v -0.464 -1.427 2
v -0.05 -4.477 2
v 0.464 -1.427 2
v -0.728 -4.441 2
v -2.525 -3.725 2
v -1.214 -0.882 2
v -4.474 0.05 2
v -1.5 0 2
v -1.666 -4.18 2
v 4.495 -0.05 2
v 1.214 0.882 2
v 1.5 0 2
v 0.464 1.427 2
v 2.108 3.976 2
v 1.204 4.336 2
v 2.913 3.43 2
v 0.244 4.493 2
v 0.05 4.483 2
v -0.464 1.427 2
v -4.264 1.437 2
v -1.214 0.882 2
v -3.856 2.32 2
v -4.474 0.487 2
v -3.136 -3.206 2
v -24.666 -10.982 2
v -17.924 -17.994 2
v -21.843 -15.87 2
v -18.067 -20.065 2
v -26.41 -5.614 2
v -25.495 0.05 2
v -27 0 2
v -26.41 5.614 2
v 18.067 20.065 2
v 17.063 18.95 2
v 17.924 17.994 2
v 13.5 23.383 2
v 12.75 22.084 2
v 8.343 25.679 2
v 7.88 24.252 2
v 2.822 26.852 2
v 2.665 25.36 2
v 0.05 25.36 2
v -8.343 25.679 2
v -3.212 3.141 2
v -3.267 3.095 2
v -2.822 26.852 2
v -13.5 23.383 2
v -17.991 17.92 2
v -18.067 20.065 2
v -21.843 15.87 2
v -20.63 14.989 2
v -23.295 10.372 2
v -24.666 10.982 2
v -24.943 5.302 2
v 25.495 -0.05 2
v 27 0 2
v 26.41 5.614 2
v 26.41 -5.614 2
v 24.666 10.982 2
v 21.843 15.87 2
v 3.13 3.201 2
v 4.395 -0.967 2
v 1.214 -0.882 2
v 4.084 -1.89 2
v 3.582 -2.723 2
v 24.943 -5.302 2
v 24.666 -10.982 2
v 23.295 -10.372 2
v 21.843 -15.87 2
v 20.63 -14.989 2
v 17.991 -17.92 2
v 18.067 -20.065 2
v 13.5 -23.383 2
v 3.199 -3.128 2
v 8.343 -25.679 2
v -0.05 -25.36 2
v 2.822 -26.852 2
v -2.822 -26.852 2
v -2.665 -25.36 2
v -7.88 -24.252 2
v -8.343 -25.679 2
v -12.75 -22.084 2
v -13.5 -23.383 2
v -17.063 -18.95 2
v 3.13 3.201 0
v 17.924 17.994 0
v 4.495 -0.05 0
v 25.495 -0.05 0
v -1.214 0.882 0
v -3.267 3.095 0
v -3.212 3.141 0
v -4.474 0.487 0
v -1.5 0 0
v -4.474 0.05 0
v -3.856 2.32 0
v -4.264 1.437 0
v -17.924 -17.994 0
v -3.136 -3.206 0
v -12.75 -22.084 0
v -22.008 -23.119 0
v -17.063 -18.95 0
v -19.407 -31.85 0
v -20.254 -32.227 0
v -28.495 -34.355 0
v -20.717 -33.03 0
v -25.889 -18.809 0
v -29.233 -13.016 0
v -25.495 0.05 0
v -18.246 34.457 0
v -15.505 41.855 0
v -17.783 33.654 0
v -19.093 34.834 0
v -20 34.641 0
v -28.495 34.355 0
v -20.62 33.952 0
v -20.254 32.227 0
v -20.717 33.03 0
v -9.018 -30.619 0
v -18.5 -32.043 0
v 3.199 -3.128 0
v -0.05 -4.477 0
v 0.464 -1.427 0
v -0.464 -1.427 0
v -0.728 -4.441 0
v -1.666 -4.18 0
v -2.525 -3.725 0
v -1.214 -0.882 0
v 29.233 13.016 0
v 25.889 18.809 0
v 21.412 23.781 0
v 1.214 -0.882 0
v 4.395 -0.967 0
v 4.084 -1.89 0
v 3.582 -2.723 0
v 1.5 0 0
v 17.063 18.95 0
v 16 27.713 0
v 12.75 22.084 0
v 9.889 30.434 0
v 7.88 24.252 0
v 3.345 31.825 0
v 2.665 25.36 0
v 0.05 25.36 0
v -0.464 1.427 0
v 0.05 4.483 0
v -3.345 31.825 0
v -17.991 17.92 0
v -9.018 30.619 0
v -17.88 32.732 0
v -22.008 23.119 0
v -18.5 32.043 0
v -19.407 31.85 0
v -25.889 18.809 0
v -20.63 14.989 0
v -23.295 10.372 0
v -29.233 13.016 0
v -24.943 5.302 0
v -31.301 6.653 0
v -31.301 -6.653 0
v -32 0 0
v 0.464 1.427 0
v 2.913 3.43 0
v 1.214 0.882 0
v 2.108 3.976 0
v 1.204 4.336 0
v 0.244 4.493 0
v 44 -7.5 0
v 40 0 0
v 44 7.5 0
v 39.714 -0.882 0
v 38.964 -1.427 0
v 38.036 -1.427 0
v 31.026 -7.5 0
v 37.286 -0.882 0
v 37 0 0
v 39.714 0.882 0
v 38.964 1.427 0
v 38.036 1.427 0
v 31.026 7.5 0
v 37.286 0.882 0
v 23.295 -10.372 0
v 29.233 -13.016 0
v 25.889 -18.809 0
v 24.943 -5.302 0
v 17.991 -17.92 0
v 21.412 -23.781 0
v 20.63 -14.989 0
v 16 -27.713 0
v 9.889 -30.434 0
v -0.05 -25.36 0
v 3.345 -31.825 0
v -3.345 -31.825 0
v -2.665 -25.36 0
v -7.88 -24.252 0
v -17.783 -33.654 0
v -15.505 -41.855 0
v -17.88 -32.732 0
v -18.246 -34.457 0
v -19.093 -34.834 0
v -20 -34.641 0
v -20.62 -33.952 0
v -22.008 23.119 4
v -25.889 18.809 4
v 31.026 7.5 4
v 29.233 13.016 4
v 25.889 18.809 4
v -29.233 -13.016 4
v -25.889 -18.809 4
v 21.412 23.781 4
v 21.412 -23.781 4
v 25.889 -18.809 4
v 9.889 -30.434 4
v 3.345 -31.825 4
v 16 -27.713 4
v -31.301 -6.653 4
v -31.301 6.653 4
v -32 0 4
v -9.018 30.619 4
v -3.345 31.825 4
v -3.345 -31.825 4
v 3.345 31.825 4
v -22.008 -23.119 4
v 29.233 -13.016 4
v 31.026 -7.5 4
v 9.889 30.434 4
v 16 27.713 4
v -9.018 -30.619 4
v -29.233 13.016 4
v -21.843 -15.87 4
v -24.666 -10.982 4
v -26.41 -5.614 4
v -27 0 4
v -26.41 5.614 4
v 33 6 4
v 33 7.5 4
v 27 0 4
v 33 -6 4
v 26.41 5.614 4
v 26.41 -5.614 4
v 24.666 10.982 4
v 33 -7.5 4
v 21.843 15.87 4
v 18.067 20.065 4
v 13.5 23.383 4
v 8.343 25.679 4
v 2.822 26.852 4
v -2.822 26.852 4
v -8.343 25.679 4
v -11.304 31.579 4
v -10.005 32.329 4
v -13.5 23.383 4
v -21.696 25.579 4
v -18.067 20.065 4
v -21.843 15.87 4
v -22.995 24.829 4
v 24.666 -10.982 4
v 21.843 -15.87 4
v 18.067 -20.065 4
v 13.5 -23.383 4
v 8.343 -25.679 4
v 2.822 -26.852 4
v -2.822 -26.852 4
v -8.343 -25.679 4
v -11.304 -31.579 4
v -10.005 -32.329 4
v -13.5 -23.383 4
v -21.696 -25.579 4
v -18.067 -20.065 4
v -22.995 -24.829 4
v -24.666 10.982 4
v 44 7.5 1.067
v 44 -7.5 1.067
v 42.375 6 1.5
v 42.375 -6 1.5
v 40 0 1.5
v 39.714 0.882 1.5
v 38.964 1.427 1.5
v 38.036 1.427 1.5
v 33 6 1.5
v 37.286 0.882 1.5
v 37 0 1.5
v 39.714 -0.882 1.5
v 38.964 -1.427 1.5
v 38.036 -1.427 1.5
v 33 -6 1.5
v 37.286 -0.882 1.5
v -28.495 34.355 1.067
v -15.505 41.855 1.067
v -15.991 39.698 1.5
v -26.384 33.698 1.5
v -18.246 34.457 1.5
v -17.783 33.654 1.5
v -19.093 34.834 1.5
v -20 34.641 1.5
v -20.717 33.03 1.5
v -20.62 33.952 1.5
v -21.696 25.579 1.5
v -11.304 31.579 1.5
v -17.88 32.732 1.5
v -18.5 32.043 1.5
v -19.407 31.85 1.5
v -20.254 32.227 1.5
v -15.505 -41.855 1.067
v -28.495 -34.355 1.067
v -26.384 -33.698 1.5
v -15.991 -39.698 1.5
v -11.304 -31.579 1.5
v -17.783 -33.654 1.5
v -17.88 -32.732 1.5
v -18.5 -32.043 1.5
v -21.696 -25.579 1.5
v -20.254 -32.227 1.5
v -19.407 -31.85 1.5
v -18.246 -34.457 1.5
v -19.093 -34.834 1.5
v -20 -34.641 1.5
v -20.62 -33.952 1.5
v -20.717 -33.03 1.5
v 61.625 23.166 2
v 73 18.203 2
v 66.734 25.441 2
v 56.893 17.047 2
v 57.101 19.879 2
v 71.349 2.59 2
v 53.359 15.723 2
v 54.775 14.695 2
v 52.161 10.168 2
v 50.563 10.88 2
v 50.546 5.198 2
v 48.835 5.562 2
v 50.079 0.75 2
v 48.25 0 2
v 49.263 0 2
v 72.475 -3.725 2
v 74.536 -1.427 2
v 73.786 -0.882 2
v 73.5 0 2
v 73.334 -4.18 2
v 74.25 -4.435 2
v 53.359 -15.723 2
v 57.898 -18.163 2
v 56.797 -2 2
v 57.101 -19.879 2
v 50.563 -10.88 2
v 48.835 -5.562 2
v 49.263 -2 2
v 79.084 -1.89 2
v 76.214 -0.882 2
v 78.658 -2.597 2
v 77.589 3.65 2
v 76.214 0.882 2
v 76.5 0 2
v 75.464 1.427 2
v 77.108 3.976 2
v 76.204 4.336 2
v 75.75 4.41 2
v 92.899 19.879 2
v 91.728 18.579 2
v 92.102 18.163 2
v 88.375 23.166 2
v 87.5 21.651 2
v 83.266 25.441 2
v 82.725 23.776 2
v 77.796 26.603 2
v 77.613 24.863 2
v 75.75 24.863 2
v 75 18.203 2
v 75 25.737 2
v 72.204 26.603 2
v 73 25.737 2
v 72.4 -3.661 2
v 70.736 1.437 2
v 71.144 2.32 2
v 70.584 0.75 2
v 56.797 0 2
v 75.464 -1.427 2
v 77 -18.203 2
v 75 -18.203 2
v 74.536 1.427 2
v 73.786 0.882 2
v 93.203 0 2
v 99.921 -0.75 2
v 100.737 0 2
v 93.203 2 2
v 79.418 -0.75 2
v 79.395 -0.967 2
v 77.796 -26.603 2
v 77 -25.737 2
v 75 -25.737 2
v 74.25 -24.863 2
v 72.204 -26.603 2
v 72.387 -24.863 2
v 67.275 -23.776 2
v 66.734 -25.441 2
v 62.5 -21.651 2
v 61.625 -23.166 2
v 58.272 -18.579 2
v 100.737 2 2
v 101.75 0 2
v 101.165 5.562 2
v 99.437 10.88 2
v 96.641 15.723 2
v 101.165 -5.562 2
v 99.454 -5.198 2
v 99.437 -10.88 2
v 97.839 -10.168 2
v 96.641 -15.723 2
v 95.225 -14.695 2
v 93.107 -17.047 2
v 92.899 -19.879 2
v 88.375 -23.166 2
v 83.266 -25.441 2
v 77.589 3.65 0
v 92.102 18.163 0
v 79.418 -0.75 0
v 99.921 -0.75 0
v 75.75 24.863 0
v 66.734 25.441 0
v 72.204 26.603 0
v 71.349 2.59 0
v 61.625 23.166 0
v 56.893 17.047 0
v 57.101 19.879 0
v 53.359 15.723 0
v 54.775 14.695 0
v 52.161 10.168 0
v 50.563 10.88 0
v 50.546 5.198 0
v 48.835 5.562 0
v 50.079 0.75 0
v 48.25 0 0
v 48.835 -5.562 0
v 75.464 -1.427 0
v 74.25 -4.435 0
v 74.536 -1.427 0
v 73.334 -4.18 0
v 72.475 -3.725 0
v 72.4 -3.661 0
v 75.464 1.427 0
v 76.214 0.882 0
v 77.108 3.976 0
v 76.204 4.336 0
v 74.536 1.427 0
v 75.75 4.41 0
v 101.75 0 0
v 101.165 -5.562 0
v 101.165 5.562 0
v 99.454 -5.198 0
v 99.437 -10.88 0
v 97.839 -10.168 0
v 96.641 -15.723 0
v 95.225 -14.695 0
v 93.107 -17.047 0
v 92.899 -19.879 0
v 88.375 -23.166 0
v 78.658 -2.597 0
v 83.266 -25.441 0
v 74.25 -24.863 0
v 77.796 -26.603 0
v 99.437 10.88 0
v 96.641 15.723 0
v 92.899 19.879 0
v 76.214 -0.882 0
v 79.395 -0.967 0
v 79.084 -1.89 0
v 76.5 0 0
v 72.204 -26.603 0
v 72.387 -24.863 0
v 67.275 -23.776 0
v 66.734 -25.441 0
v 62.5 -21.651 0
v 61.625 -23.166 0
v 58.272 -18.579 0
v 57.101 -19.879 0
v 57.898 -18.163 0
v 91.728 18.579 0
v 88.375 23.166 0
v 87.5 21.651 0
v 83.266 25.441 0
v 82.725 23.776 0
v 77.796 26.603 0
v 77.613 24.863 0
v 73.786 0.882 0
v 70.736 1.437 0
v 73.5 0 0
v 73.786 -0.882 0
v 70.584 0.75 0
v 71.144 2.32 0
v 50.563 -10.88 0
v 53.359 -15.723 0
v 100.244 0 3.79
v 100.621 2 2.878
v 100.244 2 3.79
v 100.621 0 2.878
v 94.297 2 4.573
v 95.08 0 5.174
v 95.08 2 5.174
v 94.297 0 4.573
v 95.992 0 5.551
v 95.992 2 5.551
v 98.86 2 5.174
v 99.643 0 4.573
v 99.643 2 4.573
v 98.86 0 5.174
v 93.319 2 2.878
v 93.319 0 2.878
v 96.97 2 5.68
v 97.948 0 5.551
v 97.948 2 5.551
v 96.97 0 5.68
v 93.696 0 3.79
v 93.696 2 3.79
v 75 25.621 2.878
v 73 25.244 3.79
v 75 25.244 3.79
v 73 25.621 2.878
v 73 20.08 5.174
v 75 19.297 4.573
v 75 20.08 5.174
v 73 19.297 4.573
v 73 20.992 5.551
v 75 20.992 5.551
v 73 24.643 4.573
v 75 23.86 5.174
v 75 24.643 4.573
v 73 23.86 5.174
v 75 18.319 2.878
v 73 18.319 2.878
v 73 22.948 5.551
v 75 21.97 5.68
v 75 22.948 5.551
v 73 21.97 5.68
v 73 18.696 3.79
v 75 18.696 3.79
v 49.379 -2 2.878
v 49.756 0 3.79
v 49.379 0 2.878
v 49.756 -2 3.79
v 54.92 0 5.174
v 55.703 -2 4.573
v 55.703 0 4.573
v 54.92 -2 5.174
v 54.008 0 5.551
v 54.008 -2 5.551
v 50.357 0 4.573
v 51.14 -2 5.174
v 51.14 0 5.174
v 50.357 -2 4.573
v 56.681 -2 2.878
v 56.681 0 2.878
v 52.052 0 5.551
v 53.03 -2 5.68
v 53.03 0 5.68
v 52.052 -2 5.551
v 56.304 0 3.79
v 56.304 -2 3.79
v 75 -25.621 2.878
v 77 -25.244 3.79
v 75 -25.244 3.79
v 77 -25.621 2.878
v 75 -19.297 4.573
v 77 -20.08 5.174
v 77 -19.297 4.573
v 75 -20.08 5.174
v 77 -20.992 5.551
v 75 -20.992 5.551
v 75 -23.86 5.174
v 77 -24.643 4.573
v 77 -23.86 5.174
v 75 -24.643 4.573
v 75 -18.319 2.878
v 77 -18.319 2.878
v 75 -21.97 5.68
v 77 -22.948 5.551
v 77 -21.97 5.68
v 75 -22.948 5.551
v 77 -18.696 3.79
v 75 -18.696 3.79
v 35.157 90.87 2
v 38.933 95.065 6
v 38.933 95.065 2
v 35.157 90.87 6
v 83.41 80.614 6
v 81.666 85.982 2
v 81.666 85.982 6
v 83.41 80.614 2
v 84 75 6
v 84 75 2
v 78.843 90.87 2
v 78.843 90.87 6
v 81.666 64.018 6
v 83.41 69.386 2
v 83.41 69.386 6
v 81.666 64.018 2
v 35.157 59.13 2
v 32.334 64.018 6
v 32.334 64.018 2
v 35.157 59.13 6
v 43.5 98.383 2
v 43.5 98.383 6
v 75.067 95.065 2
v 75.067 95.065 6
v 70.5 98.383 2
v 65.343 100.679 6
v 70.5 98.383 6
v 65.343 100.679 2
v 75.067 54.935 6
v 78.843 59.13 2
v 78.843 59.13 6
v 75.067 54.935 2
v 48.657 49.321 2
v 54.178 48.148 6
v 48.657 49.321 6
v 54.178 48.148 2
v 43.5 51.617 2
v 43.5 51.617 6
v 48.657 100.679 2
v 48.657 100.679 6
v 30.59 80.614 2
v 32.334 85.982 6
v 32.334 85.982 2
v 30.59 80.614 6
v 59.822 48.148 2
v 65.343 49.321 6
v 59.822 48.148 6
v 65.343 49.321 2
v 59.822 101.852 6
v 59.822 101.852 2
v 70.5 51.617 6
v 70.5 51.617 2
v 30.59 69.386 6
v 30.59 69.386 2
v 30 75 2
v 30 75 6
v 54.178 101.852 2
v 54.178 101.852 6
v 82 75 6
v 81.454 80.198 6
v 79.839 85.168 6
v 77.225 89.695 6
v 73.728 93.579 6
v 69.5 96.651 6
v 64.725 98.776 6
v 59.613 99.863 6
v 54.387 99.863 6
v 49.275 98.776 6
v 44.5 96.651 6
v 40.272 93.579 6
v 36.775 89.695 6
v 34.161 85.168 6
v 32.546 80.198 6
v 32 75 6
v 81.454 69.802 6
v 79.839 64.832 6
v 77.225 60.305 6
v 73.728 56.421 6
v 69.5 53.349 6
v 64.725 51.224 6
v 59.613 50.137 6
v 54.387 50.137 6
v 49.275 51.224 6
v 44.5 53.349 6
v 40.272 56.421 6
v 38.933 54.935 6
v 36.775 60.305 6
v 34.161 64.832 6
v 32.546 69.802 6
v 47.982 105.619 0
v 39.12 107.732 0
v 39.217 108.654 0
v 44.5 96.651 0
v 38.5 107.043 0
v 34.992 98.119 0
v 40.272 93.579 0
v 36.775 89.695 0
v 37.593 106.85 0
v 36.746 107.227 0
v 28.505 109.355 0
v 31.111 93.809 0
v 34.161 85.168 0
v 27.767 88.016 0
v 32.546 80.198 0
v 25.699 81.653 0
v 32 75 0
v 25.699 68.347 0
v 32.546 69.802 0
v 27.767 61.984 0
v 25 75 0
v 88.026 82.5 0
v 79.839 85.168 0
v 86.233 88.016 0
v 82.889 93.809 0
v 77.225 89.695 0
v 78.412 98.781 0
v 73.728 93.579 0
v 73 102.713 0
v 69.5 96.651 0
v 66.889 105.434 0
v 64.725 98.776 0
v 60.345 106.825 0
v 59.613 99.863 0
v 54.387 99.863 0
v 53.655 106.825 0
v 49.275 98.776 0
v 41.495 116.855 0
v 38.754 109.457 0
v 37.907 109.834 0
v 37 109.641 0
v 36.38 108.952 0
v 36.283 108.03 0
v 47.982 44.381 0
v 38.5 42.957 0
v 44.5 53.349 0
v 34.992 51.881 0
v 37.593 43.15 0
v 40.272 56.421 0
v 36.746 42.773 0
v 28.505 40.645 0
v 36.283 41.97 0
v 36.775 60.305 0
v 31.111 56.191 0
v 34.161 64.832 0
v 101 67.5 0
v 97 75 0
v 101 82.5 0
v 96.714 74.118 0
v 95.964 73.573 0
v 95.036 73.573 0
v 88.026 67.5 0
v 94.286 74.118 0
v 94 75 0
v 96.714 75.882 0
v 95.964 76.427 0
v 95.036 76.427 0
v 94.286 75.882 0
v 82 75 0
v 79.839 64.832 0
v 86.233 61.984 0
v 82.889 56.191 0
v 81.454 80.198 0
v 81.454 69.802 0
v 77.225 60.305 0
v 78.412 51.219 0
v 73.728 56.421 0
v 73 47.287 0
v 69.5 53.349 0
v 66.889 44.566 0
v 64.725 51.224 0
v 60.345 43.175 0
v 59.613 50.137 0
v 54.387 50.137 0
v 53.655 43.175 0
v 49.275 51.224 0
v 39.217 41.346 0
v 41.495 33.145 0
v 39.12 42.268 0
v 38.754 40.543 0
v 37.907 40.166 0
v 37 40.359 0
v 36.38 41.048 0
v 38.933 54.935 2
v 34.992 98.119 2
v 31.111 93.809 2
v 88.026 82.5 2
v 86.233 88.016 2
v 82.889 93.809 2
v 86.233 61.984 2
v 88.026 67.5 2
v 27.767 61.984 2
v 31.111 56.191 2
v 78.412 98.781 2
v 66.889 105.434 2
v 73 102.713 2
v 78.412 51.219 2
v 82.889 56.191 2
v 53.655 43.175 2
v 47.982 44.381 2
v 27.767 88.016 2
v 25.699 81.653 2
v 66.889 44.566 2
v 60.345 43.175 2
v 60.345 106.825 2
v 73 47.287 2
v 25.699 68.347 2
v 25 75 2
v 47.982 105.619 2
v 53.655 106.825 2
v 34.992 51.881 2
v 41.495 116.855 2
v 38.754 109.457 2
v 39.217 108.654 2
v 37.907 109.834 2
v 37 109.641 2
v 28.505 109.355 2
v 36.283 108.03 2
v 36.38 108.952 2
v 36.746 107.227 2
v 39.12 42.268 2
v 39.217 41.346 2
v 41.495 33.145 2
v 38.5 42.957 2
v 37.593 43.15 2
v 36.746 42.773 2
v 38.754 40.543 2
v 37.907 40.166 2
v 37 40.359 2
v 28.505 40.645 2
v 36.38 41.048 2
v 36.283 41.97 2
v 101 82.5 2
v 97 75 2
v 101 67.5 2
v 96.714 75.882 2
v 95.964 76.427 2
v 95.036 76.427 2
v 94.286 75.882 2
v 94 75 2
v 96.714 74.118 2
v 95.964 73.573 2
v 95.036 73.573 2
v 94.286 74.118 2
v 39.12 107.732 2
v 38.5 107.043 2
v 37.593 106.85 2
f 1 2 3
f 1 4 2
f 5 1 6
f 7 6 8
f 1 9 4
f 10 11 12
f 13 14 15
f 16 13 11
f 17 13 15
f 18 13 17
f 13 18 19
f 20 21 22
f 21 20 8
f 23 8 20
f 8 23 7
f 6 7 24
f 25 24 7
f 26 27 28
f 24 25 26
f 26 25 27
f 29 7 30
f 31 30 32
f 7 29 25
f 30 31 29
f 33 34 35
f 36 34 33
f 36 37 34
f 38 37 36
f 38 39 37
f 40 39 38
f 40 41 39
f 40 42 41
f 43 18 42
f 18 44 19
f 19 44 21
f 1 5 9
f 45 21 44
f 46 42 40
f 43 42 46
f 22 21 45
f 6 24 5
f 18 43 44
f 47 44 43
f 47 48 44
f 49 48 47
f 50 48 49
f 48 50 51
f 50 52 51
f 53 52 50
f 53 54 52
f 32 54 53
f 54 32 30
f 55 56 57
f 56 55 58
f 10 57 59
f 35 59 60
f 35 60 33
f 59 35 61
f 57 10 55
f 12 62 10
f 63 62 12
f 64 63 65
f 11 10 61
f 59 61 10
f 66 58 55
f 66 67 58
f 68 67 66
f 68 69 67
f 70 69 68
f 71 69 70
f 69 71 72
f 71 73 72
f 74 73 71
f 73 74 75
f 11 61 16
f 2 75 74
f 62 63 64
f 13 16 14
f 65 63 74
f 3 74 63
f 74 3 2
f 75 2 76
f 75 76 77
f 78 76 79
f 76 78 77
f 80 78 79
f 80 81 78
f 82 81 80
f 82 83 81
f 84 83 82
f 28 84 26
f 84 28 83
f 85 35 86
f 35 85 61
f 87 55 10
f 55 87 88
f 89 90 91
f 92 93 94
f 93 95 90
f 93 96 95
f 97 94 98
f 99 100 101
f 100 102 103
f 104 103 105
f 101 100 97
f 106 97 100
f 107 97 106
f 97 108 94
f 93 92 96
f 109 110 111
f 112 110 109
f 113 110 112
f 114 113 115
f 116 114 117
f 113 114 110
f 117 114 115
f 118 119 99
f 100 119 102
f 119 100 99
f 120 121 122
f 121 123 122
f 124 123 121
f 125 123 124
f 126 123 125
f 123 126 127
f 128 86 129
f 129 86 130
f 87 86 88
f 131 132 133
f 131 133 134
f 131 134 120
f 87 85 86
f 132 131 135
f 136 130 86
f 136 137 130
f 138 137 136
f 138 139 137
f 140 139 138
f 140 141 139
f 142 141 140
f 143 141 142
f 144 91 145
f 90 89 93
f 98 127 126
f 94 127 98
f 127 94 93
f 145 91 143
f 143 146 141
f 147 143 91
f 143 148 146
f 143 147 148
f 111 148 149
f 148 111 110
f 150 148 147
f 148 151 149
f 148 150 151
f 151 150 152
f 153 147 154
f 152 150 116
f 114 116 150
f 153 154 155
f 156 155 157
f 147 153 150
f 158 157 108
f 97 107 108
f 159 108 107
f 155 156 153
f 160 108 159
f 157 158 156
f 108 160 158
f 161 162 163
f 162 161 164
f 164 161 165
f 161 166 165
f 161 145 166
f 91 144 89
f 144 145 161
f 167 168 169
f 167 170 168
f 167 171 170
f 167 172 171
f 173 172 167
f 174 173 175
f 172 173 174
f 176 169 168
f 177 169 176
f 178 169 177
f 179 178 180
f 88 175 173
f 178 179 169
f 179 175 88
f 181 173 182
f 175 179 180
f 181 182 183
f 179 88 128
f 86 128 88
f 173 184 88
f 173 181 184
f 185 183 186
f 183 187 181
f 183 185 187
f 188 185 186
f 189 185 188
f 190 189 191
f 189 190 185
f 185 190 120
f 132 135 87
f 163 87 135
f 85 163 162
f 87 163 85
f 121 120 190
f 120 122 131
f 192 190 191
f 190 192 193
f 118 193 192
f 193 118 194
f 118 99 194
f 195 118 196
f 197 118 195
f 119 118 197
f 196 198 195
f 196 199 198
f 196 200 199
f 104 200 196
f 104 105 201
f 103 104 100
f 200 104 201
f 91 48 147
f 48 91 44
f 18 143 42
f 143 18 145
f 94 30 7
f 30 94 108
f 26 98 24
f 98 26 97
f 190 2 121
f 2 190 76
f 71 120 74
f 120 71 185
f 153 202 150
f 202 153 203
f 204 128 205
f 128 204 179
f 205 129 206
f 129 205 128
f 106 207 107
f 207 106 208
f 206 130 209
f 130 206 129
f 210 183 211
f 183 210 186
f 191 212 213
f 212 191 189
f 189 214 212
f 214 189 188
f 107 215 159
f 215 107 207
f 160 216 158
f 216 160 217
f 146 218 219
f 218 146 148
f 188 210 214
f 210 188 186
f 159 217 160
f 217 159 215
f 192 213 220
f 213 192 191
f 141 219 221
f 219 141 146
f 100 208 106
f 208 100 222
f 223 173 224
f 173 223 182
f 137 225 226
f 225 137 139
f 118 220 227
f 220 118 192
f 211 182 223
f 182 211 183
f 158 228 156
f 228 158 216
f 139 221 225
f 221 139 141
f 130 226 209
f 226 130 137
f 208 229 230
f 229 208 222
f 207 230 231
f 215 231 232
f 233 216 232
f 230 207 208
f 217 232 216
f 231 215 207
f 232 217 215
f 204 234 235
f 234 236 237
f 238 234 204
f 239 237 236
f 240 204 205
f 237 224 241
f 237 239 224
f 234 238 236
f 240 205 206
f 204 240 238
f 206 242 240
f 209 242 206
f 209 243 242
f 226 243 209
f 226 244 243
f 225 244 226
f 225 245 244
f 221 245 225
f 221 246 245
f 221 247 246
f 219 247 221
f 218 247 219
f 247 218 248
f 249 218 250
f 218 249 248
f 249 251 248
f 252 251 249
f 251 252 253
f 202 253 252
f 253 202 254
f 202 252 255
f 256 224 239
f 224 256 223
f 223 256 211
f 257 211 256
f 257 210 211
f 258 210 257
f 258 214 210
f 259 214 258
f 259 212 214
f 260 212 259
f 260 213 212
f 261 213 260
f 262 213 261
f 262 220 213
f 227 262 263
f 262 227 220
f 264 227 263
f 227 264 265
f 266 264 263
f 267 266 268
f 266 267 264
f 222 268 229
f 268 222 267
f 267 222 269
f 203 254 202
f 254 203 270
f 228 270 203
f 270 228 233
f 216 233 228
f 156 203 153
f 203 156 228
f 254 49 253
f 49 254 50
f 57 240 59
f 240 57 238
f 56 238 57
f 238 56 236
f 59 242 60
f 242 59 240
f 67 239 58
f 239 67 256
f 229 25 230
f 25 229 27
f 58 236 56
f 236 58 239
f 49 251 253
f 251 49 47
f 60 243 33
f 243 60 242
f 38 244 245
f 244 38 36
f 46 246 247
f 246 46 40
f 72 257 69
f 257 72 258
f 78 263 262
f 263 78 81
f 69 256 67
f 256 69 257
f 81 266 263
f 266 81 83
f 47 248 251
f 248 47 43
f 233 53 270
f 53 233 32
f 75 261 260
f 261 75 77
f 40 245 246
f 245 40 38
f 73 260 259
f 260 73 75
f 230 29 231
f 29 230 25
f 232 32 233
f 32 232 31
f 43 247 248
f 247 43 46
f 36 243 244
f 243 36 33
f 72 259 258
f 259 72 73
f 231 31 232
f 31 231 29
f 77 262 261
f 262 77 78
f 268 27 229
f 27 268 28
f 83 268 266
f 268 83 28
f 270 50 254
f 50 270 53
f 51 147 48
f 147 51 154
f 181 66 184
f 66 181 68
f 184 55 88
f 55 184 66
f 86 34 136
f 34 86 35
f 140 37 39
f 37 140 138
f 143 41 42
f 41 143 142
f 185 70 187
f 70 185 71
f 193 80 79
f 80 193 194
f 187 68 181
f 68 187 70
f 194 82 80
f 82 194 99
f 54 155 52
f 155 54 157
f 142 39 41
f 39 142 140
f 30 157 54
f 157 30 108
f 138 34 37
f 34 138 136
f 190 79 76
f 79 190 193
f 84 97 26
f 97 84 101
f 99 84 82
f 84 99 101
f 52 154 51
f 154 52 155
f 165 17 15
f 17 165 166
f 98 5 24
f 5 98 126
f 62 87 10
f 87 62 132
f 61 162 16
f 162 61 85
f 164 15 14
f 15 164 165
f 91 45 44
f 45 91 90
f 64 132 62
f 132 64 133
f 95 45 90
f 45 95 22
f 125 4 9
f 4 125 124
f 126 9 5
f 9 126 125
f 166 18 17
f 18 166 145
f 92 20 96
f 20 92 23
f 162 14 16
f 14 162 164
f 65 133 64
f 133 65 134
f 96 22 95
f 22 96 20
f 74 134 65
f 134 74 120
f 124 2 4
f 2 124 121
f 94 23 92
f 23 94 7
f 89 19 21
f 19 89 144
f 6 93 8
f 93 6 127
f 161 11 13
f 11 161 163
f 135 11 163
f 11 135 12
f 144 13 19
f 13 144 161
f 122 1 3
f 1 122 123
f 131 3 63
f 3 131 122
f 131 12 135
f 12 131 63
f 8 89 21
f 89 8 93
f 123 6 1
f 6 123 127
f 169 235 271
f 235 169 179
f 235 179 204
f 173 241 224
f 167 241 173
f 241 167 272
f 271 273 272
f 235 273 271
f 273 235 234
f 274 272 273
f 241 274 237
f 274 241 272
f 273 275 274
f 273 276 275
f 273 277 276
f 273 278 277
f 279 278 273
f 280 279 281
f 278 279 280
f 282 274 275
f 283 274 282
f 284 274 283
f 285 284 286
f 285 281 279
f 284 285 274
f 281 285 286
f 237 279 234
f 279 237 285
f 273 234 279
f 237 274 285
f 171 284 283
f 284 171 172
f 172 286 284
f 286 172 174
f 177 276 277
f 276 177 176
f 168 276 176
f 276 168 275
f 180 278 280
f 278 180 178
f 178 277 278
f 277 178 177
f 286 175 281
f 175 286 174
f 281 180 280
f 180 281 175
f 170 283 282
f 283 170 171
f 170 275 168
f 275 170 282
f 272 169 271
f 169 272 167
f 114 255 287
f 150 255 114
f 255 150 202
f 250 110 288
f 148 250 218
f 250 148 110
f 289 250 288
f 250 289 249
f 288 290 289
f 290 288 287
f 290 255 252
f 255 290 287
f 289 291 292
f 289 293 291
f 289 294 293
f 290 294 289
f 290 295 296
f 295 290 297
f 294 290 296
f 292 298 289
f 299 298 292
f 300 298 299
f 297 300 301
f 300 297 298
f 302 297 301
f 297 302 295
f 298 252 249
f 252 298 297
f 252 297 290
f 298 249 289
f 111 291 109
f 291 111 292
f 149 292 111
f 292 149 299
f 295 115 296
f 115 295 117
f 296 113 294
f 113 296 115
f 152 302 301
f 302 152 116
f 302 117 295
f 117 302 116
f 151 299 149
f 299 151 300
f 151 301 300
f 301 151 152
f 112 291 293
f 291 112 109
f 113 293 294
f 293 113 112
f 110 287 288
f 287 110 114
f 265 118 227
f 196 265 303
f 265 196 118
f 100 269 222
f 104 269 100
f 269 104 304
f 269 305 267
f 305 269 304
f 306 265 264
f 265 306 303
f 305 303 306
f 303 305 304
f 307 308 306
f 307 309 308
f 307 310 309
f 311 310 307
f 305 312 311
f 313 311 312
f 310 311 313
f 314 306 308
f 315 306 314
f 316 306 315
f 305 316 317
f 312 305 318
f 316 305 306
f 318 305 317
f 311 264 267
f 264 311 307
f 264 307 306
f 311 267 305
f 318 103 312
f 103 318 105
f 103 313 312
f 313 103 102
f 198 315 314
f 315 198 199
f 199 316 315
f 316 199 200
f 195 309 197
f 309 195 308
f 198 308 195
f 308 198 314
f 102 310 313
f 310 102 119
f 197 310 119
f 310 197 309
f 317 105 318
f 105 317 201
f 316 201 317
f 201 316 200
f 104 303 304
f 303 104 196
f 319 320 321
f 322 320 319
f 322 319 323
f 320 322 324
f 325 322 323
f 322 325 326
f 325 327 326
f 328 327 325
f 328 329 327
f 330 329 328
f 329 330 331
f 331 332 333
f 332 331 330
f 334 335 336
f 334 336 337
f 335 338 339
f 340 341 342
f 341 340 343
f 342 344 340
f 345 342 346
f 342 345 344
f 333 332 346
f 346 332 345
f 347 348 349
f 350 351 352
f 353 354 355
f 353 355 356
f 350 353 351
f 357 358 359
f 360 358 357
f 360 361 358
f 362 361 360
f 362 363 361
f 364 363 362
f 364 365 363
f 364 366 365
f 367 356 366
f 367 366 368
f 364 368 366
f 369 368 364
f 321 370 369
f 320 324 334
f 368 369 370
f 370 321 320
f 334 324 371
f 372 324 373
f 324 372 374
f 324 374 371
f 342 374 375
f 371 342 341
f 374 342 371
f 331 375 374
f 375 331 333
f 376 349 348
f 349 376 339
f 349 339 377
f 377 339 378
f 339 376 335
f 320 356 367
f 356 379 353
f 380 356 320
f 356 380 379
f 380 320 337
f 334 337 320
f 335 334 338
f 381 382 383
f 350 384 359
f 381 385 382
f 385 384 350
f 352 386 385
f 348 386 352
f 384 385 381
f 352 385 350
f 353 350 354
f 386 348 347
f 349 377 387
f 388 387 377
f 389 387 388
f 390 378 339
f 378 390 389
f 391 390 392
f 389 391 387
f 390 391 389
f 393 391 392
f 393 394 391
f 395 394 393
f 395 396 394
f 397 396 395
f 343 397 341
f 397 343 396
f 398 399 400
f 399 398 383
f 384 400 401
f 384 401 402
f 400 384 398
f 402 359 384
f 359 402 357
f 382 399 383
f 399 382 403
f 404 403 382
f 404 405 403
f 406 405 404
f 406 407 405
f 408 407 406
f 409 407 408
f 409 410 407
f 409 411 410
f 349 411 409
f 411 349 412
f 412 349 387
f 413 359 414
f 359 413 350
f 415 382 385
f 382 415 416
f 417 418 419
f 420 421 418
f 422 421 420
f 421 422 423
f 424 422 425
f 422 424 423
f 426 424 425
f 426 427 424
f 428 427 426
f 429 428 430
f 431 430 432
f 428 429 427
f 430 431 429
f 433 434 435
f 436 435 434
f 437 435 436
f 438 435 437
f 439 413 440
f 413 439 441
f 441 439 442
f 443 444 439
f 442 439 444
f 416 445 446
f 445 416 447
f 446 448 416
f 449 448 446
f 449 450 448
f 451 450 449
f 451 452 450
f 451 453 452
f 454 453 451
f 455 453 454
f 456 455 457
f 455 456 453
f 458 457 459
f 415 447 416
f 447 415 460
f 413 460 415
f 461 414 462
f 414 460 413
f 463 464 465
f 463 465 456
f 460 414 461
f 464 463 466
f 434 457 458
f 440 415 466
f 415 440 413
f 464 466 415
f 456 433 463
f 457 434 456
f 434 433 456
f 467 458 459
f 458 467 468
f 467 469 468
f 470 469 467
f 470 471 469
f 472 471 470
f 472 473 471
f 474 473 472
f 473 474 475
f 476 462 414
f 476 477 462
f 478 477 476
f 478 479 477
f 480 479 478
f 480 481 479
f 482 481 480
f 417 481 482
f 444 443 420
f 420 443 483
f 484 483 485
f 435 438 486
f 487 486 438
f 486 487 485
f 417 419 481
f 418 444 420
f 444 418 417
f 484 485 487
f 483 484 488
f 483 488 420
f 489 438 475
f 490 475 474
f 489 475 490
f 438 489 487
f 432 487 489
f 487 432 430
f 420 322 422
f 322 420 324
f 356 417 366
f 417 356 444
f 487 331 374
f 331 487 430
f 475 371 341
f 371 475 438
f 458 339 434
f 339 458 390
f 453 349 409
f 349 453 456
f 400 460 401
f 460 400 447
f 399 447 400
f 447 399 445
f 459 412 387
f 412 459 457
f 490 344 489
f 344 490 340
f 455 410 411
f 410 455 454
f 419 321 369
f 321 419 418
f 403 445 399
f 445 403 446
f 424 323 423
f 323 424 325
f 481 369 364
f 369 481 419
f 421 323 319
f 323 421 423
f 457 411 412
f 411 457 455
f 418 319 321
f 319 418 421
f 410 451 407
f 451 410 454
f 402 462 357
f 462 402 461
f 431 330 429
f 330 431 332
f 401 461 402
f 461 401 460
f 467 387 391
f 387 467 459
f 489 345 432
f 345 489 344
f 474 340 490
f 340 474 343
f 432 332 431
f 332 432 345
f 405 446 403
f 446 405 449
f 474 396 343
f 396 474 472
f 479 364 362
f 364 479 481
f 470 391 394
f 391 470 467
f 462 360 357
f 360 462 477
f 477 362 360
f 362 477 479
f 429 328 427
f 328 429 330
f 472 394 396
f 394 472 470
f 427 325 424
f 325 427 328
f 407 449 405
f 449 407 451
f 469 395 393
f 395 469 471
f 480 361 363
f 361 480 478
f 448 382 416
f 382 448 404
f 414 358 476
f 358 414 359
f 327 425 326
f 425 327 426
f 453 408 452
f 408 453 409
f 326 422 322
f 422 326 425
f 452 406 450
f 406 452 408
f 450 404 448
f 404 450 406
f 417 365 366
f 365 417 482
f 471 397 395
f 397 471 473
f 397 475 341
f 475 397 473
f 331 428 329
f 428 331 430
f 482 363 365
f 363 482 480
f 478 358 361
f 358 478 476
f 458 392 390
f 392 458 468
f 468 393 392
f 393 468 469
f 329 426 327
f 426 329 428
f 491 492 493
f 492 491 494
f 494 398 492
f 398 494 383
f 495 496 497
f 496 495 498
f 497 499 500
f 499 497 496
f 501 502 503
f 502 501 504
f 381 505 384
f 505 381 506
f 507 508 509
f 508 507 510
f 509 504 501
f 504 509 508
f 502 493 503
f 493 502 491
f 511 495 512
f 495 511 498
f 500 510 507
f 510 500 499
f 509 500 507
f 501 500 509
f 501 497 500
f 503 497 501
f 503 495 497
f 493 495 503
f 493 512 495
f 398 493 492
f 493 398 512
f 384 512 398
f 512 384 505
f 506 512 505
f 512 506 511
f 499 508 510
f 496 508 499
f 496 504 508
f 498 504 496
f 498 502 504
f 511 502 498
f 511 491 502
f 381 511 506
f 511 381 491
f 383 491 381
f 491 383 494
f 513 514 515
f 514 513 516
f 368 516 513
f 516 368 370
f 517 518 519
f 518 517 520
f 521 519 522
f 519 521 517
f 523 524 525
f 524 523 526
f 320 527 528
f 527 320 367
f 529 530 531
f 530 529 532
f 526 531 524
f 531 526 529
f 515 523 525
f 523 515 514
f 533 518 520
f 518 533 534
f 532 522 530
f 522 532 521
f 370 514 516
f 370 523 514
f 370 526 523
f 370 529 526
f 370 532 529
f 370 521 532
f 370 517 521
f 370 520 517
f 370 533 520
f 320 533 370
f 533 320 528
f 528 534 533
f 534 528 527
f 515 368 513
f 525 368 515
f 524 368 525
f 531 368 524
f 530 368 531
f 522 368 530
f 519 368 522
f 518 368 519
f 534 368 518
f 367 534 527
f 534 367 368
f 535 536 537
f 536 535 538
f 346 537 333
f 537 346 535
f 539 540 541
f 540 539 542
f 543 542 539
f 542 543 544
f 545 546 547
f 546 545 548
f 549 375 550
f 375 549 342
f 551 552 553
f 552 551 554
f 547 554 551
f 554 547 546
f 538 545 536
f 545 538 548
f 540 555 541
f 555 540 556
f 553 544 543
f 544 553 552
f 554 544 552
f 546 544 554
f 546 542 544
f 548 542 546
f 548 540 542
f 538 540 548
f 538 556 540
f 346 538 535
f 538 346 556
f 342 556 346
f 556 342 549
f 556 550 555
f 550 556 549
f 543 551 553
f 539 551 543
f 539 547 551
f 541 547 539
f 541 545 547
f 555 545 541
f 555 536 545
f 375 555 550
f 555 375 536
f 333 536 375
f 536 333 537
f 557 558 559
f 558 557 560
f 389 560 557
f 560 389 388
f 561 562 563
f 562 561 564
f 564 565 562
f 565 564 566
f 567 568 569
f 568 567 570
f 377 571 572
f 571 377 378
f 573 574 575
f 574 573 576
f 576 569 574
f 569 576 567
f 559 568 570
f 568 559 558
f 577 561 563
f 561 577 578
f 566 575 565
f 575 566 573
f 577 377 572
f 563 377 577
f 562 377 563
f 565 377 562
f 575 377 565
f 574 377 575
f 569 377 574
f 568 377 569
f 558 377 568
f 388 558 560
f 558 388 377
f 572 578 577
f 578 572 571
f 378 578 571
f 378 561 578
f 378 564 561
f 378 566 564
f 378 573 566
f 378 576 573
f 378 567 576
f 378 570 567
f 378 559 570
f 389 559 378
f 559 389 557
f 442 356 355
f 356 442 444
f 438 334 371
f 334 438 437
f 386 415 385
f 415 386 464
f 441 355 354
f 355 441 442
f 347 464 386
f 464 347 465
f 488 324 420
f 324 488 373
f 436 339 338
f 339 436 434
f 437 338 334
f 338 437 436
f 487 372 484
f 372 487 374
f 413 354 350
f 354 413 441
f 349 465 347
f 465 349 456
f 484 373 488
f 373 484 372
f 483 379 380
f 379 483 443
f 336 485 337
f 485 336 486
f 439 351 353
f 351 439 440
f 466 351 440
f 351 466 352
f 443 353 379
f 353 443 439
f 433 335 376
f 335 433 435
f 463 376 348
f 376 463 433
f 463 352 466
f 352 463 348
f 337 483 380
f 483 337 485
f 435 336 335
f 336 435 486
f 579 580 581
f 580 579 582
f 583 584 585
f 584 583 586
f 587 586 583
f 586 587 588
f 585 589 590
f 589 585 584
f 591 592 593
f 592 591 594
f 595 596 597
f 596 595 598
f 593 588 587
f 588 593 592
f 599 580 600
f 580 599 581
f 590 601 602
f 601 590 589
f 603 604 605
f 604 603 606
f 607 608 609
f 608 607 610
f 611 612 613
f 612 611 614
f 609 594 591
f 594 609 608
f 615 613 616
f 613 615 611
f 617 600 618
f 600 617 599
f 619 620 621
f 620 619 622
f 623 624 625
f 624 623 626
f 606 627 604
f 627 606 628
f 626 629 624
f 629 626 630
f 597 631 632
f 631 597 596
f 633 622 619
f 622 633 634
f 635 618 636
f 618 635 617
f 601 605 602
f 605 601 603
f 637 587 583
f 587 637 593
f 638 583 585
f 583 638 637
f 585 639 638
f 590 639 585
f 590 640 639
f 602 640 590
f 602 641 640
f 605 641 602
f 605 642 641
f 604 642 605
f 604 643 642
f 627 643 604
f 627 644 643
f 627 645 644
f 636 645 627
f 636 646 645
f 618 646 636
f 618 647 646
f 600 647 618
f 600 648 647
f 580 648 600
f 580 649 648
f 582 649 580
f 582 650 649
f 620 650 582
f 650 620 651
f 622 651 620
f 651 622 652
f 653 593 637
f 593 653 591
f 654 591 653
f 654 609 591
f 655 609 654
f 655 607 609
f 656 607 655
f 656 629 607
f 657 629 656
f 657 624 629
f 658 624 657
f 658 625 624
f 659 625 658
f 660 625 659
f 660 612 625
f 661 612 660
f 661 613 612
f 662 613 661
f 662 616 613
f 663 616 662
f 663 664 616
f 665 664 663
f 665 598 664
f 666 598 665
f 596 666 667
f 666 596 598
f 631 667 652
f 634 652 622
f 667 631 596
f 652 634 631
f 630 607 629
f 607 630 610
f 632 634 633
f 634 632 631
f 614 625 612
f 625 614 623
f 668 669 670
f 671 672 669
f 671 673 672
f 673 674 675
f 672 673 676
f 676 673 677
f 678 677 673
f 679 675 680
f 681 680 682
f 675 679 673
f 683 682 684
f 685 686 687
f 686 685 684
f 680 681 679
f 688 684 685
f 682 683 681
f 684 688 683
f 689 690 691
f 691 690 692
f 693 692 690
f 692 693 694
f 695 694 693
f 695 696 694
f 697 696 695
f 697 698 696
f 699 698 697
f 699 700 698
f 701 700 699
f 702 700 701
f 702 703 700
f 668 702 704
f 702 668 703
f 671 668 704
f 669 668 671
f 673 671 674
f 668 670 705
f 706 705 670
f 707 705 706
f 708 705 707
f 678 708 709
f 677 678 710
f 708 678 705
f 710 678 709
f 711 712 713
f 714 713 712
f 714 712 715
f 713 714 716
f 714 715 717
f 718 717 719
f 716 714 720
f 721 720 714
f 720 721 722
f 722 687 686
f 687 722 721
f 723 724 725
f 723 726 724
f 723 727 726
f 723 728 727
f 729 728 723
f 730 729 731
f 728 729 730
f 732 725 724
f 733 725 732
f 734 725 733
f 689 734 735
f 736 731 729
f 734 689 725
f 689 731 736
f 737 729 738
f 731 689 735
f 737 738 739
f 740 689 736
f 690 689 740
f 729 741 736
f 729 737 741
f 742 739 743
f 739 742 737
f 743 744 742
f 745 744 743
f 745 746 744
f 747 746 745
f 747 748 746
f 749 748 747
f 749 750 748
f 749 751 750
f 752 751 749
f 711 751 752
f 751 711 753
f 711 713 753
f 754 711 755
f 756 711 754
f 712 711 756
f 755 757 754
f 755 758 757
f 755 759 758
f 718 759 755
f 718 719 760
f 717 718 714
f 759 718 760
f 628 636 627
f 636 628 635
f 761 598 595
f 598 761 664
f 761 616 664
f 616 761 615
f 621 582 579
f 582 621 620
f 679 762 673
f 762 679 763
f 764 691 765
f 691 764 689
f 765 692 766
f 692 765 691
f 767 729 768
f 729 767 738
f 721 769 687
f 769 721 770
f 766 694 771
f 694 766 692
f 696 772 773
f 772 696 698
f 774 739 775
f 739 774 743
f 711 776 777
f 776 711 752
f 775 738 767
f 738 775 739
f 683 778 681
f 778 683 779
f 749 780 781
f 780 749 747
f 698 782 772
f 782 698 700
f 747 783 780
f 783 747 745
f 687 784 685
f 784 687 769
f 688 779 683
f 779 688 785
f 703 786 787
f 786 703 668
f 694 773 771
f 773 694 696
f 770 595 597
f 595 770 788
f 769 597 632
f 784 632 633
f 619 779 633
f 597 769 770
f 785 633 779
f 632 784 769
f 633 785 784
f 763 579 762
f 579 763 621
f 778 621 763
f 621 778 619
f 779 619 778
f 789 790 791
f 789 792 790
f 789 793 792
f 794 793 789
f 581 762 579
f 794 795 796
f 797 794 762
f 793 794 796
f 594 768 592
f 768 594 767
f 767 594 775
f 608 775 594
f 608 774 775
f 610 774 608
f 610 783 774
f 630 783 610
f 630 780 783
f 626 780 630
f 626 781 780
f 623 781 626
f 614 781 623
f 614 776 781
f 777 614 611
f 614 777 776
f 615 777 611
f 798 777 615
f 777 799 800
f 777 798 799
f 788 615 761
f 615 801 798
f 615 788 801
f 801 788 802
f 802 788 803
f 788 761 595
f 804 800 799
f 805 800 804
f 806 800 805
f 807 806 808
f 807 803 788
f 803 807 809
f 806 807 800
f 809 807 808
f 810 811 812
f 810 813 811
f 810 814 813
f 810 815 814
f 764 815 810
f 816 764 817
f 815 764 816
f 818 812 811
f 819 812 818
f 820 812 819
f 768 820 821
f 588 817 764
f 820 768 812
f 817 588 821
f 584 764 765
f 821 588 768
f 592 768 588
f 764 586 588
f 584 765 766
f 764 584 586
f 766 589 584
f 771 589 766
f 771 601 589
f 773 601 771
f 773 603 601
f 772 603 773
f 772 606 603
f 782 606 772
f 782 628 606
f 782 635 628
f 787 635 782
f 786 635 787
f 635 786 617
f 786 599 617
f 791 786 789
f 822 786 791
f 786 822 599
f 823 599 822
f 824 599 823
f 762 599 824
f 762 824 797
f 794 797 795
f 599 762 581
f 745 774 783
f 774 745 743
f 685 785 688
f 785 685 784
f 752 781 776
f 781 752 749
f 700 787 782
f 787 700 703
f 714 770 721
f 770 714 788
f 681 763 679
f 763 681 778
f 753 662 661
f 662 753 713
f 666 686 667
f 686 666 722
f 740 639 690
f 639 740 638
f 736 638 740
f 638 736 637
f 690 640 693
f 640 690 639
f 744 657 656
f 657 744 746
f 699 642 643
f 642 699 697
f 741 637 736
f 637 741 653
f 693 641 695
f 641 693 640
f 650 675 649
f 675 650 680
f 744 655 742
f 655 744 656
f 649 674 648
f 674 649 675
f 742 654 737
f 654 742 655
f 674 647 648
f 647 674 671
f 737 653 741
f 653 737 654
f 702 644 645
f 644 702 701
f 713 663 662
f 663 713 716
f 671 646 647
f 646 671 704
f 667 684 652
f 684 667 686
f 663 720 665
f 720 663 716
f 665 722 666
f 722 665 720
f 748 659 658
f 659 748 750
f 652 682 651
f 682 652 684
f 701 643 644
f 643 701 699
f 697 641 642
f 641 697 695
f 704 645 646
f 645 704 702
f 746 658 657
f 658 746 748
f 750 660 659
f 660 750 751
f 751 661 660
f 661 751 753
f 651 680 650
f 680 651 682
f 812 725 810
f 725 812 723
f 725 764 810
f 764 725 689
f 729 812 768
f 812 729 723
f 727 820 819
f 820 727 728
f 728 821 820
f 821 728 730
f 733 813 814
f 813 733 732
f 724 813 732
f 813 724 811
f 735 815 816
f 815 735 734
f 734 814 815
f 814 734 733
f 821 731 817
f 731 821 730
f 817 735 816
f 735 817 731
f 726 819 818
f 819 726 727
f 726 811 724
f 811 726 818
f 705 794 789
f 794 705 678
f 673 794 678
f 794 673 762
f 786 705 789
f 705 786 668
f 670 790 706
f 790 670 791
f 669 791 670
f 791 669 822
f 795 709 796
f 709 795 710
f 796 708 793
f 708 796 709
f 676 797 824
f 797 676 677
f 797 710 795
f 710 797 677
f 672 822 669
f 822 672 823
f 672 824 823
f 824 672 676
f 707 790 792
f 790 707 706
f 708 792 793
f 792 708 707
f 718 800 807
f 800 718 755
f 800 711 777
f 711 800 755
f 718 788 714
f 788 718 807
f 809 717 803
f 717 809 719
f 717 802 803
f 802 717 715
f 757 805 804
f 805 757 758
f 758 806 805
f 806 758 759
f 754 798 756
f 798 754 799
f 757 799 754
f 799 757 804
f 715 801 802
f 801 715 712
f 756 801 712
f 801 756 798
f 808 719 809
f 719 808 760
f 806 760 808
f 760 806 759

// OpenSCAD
// [FL_INDEX: keywords="openscad, 3d_parametric, Customizable_rotating_ajustable_vent, csg_solid" | COT="Parametric OpenSCAD design from 3DCodeverse"]
// Title: Customizable rotating ajustable vent

// Ilmion
// 2013-05

// preview[view:south, tilt:top]

/* [Parameters] */
// Which one would you like to see?
part = "all"; // [first:Vent hole,second:vent door,third:inside part, both:Vent hole and door, all:all]
// Diameter (in mm) of the hole to be ventillated (default : 54 mm = 2 1/8 inches)
Hole_Diameter = 54; // [2.0:170.0]
// Thickness (in mm) total of the vent door and holed part (default : 4 mm)
Thickness = 4; // [1.0:20.0]
// Number of hole in the vent (default : 4)
Number_of_Ventilation_hole = 4; // [2:6]
// How much wider (in mm) are the door compare to the hole they hide (default : 1.5 mm)
Plus_Width_of_door = 1.5; // [1.00:5.00]
// Tolerance (in mm) for better fitting of the door in the vent (default : 0.25)
Tolerance = 0.25; // [0.00:1.00]
// Thickness (in mm) of the wall to be ventillated. Set the height of the inside part.
Enclosure_Thickness = 4; // [1:20]
// Diameter (in mm) of the hole used for connecting the door with the holed part (default : 3 for 3mm filament)
Joint_Diameter = 3; // [0: 10]

/* [Screws] */

// Number of screw fixation (default : 3)
Number_of_fixation = 3; // [2:6]
// Diameter (in mm) of the screw to be use to fix the vent (default : 3mm)
Screw_diameter = 3;

/* [Hidden] */

gAngle = 360/(Number_of_Ventilation_hole*2);
gCenterDiam = max(0.20 * (Hole_Diameter/2), 9);
gScrewSectionLength = Screw_diameter*5;
gScrewSectionWidth = Screw_diameter*5;
$fs=1;

print_part();

module print_part() {
	if (part == "first") {
		VentHole();
	} else if (part == "second") {
		VentDoor();
	} else if (part == "both") {
		VentHole();
		translate([Hole_Diameter+16,0,0]) VentDoor();
	} else if (part == "third") {
		InsideConnector();
	} else if (part == "all") {
		VentHole();
		translate([Hole_Diameter+gScrewSectionLength+6,0,0]) VentDoor();
		translate([Hole_Diameter/3*2+gScrewSectionLength+6, Hole_Diameter+gScrewSectionLength+6,0]) InsideConnector();
	} else {
		VentHole();
		translate([Hole_Diameter+gScrewSectionLength+6,0,0]) VentDoor();
		translate([Hole_Diameter/3*2+gScrewSectionLength+6, Hole_Diameter+gScrewSectionLength+6,0]) InsideConnector();
	}
}

module ScrewSection()
{
	difference()
	{
		union()
		{
			cube([4,gScrewSectionWidth,Thickness]);
			translate([4,gScrewSectionWidth,0]) rotate([90,0,0]) linear_extrude(height = gScrewSectionWidth) polygon([[0,0], [0, Thickness], [gScrewSectionLength,0]]);
		}
		translate([4, 1.5, 1.5]) cube([gScrewSectionLength+10, gScrewSectionWidth-3, Thickness+5]);
		translate([gScrewSectionLength*0.5+2,gScrewSectionWidth/2,-1]) cylinder(h=10, r=Screw_diameter/2);
		translate([gScrewSectionLength,-1,-1]) cube([20,gScrewSectionWidth+2,20]);
	}
}

module FlatScrewSection()
{
	difference()
	{
		cube([gScrewSectionLength,gScrewSectionWidth,2]);
		translate([gScrewSectionLength*0.5+2, gScrewSectionWidth/2,-1]) cylinder(h=10, r=Screw_diameter/2);
	}
}

module Helice(pAngle, pDiam, pHeight, pWidth = 0.1)
{
	union()
	{
		for (i = [0:Number_of_Ventilation_hole-1])
		{
			hull()
			{
				rotate([0,0, (i * pAngle) + (i * (360 - (Number_of_Ventilation_hole*pAngle)) / Number_of_Ventilation_hole)]) 
				{
					translate([0, pWidth/-2,0]) cube([pDiam, pWidth, pHeight]);
					rotate([0,0, pAngle]) translate([0, pWidth/-2,0])cube([pDiam, pWidth, pHeight]);
				}
			}
		}
	}
}

module VentHole()
{
	union()
	{
	difference()
	{
		union()
		{
			difference()
			{
				Helice(gAngle, Hole_Diameter, Thickness/2);
				translate([0, 0, -1])
				{
					difference()
					{
						cylinder(h=Thickness+2, r=Hole_Diameter + 5);
						translate([0, 0, -1])
						{
							cylinder(h=Thickness+4, r=(Hole_Diameter / 2) + 5);
						}
					}
				}
			}
			cylinder(h=Thickness/2, r=gCenterDiam / 2);
			difference()
			{
				cylinder(h=Thickness, r=Hole_Diameter / 2 + 5);
				translate([0,0,-1]) cylinder(h=Thickness+2, r=Hole_Diameter / 2);
			}
			difference()
			{
				cylinder(h=Thickness/2, r=Hole_Diameter/2+1);
				translate([0,0,-1]) cylinder(h=Thickness/2+2, r=Hole_Diameter/2-1.5);
			}
		}
		if(Joint_Diameter > 0)
		{
			translate([0,0,-3]) cylinder(h=Thickness + 10, r=Joint_Diameter/2);
		}
	}
	for (j = [0:Number_of_fixation-1])
	{
		rotate([0,0,j*(360/Number_of_fixation)]) translate([Hole_Diameter/2+2, gScrewSectionWidth/-2,0]) ScrewSection();
	}
	}
}

module Pognee()
{
	rotate([90,0,0])
	difference()
	{
		cylinder(h=2, r=0.07*Hole_Diameter);
		translate([Hole_Diameter/2*-1,Hole_Diameter*-1,-1]) cube(Hole_Diameter,Hole_Diameter,4);
	}
}

module VentDoor()
{
	difference()
	{
		union()
		{
			difference()
			{
				Helice(gAngle, Hole_Diameter, Thickness/2, Plus_Width_of_door);
				
				translate([0,0,-1]) 
				{
					difference()
					{
						cylinder(h=Thickness/2+2, r=Hole_Diameter*2);
						translate([0,0,-1]) cylinder(h=Thickness/2+4, r=Hole_Diameter/2-Tolerance);
					}
				}
			}
			cylinder(h=Thickness/2, r=gCenterDiam/2);
			difference()
			{
			cylinder(h=Thickness/2, r=Hole_Diameter/2-Tolerance);
			translate([0,0,-1]) cylinder(Thickness/2+2, r=Hole_Diameter/2-2);
			}
			for (j = [0:Number_of_Ventilation_hole-1])
			{
				rotate([0,0,j*(360/Number_of_Ventilation_hole)]) translate([Hole_Diameter/2-0.07*Hole_Diameter-Tolerance-1,2,Thickness/2-0.1])
				{
					Pognee();
				}
			}
		}
		if(Joint_Diameter > 0)
		{
			translate([0,0,-3]) cylinder(h=Thickness + 10, r=Joint_Diameter/2);
		}
	}
}

module InsideConnector()
{
	difference()
	{
		union()
		{
			cylinder(h=Enclosure_Thickness+2, r=Hole_Diameter/2);
			cylinder(h=2, r=Hole_Diameter / 2 + 5);
		}
		translate([0,0,-1]) cylinder(h=Enclosure_Thickness+4, r=Hole_Diameter/2-2);
	}
	for (j = [0:Number_of_fixation-1])
	{
		rotate([0,0,j*(360/Number_of_fixation)]) translate([Hole_Diameter/2+2, gScrewSectionWidth/-2,0]) FlatScrewSection();
	}
}
